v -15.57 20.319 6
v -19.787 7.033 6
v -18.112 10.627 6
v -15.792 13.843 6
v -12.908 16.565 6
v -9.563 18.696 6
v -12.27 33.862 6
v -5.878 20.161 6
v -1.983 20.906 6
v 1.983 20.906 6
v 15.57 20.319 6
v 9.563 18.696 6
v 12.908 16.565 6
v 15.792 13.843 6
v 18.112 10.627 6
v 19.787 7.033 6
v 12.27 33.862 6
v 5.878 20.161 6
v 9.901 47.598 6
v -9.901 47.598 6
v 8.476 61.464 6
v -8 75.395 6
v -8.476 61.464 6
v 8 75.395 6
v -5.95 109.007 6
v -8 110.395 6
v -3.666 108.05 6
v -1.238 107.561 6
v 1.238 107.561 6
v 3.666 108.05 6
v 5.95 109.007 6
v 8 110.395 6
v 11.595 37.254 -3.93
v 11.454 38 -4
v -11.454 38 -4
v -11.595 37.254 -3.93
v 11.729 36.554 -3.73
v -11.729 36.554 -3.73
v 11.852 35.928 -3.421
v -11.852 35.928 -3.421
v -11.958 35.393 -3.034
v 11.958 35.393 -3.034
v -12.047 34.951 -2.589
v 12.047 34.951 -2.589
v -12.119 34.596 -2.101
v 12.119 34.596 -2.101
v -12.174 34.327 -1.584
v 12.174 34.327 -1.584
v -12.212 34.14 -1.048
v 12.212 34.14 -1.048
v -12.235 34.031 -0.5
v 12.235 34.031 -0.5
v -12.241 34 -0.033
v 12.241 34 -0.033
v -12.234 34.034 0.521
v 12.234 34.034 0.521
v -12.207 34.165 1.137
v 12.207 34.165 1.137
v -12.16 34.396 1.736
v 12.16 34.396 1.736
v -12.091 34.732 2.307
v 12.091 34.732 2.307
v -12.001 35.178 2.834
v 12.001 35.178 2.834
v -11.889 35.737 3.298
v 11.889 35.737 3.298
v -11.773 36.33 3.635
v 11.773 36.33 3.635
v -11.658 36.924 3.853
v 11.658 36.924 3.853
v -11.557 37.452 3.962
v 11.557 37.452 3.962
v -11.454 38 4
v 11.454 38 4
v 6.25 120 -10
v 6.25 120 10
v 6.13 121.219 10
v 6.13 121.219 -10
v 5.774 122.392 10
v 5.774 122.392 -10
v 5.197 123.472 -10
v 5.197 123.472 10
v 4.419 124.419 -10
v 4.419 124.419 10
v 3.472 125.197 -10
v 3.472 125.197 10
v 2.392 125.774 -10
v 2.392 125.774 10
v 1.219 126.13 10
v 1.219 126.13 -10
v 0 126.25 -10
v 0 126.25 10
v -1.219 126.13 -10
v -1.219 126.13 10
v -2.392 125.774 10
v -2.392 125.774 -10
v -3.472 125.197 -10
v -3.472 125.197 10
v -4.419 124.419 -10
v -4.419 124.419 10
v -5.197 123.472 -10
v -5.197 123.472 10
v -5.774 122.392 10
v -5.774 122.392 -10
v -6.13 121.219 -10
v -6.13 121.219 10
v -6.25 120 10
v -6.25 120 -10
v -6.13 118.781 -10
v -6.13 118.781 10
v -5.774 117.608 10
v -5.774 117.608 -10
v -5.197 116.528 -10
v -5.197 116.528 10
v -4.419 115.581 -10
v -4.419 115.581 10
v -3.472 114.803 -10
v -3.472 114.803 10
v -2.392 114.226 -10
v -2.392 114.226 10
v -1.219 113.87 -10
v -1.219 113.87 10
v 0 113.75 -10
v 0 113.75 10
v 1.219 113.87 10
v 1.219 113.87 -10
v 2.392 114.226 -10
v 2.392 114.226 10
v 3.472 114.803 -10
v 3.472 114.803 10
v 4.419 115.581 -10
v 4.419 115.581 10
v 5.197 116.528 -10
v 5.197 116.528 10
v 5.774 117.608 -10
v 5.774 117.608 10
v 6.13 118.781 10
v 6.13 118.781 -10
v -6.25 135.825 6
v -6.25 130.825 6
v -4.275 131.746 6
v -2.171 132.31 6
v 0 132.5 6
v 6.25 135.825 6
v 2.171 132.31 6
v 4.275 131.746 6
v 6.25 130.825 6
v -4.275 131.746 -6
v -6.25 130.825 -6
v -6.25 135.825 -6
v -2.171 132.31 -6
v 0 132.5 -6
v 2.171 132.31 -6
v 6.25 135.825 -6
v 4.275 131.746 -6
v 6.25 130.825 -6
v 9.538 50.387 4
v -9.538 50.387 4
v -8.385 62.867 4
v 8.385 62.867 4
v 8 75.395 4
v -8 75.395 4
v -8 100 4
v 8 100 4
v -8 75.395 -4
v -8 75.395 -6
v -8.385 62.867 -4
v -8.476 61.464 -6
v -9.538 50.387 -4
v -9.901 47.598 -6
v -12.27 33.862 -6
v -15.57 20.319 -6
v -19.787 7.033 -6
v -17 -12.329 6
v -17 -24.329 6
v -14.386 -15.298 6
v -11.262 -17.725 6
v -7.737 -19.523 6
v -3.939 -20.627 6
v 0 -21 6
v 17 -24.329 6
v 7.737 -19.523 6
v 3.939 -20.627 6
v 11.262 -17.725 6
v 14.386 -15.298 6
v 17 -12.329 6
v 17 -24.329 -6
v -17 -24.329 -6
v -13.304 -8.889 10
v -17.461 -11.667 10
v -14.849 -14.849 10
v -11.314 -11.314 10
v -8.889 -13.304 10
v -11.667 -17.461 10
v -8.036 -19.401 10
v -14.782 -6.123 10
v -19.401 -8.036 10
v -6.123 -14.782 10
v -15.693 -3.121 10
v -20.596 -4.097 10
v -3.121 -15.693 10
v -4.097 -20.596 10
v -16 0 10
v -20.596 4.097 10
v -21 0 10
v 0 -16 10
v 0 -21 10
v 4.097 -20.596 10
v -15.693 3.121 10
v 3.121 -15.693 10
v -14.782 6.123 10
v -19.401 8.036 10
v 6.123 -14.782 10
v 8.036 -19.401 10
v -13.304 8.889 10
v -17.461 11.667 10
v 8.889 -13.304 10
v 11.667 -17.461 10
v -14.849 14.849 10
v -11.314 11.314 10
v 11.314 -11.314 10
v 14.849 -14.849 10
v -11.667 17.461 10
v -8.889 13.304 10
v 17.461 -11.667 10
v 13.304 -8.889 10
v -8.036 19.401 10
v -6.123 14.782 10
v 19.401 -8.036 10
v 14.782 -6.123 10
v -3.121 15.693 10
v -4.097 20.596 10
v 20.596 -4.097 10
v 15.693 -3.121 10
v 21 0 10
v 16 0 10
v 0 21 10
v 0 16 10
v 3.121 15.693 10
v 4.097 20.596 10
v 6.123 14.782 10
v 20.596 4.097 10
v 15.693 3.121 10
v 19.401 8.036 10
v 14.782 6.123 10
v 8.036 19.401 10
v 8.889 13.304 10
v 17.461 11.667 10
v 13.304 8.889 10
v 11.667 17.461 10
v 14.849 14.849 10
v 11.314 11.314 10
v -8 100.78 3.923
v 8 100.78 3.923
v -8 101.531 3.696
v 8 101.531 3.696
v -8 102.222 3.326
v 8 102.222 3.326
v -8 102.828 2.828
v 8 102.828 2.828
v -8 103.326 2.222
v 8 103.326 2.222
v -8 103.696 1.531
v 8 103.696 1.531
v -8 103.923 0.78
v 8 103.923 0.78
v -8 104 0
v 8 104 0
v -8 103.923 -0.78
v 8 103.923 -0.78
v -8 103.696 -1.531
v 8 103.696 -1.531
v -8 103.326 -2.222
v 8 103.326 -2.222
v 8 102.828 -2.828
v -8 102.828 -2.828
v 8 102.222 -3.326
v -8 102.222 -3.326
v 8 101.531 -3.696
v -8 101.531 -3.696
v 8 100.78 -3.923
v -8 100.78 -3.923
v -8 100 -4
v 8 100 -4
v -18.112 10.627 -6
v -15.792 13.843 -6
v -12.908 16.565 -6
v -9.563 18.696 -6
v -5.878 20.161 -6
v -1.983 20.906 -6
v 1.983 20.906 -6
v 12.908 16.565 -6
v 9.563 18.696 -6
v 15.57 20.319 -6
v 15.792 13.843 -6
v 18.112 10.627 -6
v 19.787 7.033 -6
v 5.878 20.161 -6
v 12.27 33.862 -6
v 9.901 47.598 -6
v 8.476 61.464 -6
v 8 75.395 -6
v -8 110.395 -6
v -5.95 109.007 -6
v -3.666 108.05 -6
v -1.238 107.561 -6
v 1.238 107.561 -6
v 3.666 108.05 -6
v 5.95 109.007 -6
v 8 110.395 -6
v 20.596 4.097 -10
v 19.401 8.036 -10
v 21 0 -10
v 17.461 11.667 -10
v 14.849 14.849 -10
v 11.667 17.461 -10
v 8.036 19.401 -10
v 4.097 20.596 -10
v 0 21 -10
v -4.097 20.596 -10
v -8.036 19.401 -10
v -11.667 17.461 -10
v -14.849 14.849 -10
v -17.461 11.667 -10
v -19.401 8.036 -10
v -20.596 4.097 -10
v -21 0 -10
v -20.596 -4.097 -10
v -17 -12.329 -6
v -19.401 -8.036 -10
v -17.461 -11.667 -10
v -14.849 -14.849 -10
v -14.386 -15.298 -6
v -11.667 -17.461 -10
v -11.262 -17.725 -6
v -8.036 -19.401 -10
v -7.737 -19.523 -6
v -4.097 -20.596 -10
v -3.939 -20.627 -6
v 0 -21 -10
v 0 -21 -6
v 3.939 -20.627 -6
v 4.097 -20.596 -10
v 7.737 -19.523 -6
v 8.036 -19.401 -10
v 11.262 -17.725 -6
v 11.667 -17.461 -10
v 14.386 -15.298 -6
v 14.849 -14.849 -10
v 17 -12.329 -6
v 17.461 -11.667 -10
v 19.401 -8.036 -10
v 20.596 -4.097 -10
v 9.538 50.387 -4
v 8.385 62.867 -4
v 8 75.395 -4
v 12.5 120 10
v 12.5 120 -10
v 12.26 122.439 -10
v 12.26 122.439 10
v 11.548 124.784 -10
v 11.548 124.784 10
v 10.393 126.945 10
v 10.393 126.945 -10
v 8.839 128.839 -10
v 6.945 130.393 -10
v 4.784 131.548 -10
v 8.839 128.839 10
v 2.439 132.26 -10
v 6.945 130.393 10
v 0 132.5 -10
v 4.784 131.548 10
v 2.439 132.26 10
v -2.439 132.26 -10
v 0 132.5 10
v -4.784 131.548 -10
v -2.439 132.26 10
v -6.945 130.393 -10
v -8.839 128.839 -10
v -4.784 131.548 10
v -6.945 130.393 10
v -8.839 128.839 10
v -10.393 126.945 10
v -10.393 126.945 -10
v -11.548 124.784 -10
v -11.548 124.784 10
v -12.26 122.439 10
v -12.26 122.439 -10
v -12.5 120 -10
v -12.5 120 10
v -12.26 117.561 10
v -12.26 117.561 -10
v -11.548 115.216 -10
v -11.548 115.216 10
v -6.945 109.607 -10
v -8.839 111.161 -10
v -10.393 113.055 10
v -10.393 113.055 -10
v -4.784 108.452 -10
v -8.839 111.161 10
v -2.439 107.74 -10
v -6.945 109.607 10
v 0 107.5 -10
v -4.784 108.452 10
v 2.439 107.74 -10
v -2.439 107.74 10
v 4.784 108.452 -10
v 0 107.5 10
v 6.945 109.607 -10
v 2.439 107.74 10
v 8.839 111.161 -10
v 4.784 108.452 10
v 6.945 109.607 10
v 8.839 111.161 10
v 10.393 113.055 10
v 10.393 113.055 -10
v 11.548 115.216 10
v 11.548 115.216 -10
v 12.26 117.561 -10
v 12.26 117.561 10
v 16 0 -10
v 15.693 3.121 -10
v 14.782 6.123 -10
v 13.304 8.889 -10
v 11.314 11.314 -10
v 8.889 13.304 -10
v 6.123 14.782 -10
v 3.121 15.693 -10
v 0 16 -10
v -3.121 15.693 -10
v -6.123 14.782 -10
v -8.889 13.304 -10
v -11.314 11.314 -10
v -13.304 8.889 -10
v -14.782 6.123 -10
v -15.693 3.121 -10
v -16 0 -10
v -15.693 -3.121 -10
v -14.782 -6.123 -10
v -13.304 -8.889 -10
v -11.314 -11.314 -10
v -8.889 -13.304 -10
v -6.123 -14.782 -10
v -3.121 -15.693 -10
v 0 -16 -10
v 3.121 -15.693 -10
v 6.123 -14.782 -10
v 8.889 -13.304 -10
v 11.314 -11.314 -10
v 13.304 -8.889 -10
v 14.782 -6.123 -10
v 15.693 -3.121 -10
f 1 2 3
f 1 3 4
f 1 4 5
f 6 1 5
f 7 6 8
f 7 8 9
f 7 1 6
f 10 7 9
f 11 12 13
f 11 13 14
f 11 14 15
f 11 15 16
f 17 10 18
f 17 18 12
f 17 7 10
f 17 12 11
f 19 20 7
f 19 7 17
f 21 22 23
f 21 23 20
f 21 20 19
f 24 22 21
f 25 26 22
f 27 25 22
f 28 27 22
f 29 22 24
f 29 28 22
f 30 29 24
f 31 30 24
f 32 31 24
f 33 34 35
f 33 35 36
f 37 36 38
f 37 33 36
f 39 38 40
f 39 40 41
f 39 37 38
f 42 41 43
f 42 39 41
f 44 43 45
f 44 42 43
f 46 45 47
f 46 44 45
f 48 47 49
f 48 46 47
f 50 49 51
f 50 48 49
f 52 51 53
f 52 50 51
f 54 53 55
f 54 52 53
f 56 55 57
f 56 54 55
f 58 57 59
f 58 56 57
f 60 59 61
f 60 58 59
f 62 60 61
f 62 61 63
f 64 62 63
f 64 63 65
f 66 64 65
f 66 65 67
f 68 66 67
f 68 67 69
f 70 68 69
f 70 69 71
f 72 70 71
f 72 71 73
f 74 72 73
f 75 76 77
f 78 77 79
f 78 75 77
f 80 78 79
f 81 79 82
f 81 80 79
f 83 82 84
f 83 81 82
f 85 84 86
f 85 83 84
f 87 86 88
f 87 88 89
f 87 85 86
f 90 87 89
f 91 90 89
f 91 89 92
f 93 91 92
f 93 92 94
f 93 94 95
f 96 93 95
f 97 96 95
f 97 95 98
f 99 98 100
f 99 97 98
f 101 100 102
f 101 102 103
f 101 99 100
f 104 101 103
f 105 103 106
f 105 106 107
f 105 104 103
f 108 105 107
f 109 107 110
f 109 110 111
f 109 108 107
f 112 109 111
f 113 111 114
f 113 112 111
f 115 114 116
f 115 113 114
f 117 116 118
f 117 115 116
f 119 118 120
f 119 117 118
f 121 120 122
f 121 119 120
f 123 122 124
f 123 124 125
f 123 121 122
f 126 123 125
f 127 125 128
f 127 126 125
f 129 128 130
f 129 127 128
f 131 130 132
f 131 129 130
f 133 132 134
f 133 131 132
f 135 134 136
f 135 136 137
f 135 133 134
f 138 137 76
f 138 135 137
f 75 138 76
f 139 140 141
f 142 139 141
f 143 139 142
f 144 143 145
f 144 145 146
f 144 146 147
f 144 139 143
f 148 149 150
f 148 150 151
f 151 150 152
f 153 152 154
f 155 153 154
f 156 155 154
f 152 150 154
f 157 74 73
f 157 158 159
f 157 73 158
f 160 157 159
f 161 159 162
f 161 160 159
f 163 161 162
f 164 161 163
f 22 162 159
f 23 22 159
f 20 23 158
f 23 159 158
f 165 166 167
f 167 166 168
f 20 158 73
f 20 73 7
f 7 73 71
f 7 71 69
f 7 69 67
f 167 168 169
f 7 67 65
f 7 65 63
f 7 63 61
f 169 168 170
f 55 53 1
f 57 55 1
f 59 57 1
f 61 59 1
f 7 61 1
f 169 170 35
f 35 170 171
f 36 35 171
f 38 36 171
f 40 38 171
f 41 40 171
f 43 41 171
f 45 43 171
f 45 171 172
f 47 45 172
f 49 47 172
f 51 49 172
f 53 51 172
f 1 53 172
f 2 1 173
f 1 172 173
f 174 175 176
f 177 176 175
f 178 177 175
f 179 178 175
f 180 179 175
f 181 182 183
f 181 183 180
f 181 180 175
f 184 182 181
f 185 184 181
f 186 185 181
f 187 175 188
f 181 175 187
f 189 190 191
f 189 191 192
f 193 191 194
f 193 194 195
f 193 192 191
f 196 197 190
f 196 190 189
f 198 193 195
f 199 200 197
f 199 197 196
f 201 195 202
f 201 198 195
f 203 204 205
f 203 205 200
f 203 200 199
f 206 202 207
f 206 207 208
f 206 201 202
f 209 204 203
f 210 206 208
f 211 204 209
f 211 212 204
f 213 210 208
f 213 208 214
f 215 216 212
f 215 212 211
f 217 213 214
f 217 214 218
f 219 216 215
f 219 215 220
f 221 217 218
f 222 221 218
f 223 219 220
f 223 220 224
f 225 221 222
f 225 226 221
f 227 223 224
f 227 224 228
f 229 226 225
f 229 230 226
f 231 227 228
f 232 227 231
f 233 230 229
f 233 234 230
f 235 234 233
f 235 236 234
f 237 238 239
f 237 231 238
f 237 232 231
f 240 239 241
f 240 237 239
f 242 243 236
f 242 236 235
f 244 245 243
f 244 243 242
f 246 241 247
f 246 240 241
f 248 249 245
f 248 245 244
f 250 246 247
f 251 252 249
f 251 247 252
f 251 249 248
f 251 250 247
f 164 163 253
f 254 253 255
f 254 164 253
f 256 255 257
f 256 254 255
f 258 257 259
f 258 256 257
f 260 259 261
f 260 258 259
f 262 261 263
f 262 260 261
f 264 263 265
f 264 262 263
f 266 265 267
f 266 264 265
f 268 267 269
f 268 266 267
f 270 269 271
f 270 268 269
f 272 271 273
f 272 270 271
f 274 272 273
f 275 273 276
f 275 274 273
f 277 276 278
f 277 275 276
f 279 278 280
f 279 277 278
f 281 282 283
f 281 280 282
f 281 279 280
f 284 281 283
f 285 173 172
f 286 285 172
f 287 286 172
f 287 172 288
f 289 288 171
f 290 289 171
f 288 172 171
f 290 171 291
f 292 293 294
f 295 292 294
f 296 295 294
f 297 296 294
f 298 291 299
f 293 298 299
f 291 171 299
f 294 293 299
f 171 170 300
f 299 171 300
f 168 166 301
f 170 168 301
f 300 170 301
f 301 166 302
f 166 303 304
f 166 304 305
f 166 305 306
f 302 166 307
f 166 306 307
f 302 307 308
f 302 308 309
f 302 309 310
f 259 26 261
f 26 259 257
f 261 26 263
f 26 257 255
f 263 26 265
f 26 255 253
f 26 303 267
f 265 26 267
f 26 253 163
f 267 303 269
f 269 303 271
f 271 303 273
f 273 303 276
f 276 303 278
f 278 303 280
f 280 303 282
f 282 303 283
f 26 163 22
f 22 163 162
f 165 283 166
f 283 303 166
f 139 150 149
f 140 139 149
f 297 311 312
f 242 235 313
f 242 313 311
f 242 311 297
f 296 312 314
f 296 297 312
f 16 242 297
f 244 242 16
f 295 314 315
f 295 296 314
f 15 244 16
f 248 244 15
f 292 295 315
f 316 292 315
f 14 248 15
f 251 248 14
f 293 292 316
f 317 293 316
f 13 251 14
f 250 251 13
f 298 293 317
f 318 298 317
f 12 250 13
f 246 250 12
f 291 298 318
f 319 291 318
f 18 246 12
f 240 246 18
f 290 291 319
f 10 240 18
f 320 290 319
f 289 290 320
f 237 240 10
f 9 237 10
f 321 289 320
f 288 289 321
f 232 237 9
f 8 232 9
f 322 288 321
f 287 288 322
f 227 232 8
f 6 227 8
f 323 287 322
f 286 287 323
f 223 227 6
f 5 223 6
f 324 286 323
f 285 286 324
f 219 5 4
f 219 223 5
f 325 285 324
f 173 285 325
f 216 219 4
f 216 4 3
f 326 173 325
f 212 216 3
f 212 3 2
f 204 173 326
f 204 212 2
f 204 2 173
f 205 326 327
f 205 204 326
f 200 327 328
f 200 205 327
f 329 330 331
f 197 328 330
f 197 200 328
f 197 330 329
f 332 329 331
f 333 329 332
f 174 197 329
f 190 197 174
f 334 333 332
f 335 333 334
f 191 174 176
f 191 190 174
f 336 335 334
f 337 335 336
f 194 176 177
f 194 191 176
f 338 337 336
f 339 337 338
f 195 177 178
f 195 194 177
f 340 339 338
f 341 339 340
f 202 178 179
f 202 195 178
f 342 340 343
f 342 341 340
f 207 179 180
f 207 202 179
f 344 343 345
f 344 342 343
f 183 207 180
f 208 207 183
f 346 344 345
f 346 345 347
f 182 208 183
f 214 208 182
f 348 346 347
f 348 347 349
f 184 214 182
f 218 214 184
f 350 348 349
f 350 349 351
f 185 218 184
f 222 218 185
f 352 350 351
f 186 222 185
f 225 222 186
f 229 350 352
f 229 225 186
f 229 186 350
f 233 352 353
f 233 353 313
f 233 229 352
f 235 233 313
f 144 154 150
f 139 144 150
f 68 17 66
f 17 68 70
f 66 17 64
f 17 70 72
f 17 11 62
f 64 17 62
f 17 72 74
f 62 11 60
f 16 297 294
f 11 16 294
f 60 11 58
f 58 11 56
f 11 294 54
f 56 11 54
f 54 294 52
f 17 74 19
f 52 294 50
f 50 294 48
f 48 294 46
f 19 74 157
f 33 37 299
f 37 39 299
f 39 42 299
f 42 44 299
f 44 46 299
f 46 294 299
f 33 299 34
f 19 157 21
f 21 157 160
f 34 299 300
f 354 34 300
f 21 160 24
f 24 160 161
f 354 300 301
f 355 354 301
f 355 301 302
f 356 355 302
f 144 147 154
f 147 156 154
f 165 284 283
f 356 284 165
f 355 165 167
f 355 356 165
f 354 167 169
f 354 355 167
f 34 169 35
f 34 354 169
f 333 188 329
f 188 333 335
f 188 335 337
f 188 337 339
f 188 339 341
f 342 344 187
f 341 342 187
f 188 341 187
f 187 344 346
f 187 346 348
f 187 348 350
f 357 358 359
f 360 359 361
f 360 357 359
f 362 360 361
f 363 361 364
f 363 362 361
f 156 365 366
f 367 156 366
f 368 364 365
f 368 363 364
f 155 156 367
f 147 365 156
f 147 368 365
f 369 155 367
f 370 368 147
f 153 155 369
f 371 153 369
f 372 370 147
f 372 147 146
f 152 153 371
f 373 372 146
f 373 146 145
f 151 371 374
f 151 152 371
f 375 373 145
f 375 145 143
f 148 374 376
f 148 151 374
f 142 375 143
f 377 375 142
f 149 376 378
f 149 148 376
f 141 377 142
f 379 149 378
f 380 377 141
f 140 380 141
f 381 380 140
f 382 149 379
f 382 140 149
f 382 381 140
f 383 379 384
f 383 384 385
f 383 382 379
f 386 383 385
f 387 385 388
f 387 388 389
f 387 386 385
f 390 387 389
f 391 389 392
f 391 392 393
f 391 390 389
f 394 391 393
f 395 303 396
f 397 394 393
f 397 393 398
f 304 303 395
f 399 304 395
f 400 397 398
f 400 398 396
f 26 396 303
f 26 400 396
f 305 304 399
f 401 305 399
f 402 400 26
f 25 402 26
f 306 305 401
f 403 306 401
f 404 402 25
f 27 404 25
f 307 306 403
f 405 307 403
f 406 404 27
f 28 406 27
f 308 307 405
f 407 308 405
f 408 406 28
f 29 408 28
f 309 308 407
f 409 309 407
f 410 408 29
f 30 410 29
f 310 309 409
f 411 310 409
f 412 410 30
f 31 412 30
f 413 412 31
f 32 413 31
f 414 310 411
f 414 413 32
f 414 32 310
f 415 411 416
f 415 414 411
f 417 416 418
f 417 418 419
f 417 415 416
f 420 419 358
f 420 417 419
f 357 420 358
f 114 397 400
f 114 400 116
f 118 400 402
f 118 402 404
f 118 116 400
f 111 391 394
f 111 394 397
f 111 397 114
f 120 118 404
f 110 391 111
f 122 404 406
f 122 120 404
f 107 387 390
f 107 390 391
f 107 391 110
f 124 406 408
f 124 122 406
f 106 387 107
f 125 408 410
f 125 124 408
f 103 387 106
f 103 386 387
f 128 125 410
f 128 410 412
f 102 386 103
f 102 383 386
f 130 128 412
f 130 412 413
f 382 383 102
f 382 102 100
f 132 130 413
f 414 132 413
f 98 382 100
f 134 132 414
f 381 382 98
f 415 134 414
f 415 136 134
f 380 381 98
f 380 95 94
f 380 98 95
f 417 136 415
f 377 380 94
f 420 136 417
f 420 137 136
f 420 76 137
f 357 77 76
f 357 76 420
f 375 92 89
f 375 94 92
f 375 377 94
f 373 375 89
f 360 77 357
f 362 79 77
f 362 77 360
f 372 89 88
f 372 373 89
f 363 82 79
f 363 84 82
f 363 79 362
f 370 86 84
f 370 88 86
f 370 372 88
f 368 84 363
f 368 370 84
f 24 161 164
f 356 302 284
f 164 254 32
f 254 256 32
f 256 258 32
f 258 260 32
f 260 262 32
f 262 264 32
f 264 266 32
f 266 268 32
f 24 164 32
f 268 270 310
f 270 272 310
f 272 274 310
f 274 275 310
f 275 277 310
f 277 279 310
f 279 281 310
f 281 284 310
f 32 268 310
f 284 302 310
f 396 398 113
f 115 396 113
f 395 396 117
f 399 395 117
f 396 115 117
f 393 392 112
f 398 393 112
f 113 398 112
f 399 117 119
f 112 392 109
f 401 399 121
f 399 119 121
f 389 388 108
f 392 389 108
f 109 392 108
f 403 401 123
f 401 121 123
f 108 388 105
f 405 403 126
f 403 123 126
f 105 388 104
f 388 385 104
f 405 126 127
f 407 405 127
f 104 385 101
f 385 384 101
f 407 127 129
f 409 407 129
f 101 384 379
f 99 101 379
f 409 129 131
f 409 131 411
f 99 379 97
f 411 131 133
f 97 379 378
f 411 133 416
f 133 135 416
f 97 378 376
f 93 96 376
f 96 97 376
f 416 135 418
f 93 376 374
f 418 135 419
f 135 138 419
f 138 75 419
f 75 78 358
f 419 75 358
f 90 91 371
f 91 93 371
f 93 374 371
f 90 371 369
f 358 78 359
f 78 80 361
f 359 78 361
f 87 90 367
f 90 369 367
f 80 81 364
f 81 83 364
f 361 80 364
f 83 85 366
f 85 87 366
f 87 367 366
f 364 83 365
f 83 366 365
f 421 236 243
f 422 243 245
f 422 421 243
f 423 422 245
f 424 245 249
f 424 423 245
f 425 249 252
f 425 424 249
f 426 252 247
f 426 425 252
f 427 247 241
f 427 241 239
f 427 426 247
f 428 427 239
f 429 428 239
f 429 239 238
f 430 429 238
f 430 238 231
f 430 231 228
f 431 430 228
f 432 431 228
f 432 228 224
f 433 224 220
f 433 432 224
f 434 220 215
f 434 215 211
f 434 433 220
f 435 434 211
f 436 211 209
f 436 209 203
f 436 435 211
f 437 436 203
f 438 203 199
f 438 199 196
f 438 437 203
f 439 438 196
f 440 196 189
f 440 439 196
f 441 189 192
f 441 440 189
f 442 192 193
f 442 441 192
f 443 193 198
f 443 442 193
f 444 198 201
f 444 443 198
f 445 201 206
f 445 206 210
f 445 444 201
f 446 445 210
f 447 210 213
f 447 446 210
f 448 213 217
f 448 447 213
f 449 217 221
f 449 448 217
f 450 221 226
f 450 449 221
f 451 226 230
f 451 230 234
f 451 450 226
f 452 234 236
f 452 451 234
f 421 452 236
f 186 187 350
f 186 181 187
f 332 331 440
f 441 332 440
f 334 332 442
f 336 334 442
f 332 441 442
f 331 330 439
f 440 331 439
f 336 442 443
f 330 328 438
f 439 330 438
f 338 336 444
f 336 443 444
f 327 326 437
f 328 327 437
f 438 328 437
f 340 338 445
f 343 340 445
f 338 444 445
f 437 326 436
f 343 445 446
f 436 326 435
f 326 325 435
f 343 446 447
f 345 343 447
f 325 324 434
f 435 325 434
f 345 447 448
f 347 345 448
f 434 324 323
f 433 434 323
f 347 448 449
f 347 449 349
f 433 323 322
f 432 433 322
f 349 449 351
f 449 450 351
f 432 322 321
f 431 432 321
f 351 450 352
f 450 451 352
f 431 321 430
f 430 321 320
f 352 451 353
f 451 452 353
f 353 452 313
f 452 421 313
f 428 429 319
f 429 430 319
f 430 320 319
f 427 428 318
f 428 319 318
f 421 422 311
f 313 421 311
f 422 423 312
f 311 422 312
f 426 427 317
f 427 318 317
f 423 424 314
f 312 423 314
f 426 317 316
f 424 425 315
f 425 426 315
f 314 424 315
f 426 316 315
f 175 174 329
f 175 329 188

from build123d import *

# Parameters (mm, degrees)
SKETCH1_R               = 21
SKETCH1_R_2             = 16
BOSS_EXTRUDE1_DEPTH     = 10
SKETCH1_R_3             = 12.5
SKETCH1_R_4             = 6.25
BOSS_EXTRUDE1_2_DEPTH   = 10
BOSS_EXTRUDE2_DEPTH     = 6
CUT_EXTRUDE1_START      = -6
CUT_EXTRUDE1_DEPTH      = 22
CUT_EXTRUDE1_DEPTH_BACK = 16


with BuildPart() as part:
    # Sketch1 → Boss-Extrude1 (new body, symmetric)
    with BuildSketch(Plane.XY):
        Circle(SKETCH1_R)
        Circle(SKETCH1_R_2, mode=Mode.SUBTRACT)
    extrude(amount=BOSS_EXTRUDE1_DEPTH, both=True)



with BuildPart() as body_2:
    # Sketch1 → Boss-Extrude1 2 (new body, symmetric)
    with BuildSketch(Plane.XY):
        with Locations((0, 120)):
            Circle(SKETCH1_R_3)
        with Locations((0, 120)):
            Circle(SKETCH1_R_4, mode=Mode.SUBTRACT)
    extrude(amount=BOSS_EXTRUDE1_2_DEPTH, both=True)


with BuildPart() as part_1:
    add(part.part)

    add(body_2.part)  # Boss-Extrude2 merges body 2
    # Sketch1<4> → Boss-Extrude2 (add, symmetric)
    with BuildSketch(Plane.XY):
        with BuildLine():
            Line((-8, 110.395313644), (-8, 75.395313644))
            ThreePointArc((-8, 75.395313644), (-10.96842855, 40.709642053), (-19.787382488, 7.032744434))
            ThreePointArc((-19.787382488, 7.032744434), (0, 21), (19.787382488, 7.032744434))
            ThreePointArc((19.787382488, 7.032744434), (10.96842855, 40.709642053), (8, 75.395313644))
            Line((8, 75.395313644), (8, 110.395313644))
            ThreePointArc((8, 110.395313644), (0, 107.5), (-8, 110.395313644))
        make_face()
        with BuildLine():
            Line((-6.25, 135.825317547), (-6.25, 130.825317547))
            ThreePointArc((-6.25, 130.825317547), (0, 132.5), (6.25, 130.825317547))
            Line((6.25, 130.825317547), (6.25, 135.825317547))
            Line((6.25, 135.825317547), (-6.25, 135.825317547))
        make_face()
        with BuildLine():
            ThreePointArc((17, -12.328828006), (0, -21), (-17, -12.328828006))
            Line((-17, -12.328828006), (-17, -24.328828006))
            Line((-17, -24.328828006), (17, -24.328828006))
            Line((17, -24.328828006), (17, -12.328828006))
        make_face()
    extrude(amount=BOSS_EXTRUDE2_DEPTH, both=True)

    # Sketch2 → Cut-Extrude1 (cut, two sides)
    with BuildSketch(Plane(origin=(0, 0, 0), x_dir=(0, 0, -1), z_dir=(1, 0, 0)).offset(CUT_EXTRUDE1_START)) as cut_extrude1_sk:
        with BuildLine():
            Line((4, 100), (4, 38))
            ThreePointArc((4, 38), (0, 34), (-4, 38))
            Line((-4, 38), (-4, 100))
            ThreePointArc((-4, 100), (0, 104), (4, 100))
        make_face()
    extrude(amount=CUT_EXTRUDE1_DEPTH, mode=Mode.SUBTRACT)
    extrude(cut_extrude1_sk.sketch, amount=-CUT_EXTRUDE1_DEPTH_BACK, mode=Mode.SUBTRACT)


solid = part_1.part
